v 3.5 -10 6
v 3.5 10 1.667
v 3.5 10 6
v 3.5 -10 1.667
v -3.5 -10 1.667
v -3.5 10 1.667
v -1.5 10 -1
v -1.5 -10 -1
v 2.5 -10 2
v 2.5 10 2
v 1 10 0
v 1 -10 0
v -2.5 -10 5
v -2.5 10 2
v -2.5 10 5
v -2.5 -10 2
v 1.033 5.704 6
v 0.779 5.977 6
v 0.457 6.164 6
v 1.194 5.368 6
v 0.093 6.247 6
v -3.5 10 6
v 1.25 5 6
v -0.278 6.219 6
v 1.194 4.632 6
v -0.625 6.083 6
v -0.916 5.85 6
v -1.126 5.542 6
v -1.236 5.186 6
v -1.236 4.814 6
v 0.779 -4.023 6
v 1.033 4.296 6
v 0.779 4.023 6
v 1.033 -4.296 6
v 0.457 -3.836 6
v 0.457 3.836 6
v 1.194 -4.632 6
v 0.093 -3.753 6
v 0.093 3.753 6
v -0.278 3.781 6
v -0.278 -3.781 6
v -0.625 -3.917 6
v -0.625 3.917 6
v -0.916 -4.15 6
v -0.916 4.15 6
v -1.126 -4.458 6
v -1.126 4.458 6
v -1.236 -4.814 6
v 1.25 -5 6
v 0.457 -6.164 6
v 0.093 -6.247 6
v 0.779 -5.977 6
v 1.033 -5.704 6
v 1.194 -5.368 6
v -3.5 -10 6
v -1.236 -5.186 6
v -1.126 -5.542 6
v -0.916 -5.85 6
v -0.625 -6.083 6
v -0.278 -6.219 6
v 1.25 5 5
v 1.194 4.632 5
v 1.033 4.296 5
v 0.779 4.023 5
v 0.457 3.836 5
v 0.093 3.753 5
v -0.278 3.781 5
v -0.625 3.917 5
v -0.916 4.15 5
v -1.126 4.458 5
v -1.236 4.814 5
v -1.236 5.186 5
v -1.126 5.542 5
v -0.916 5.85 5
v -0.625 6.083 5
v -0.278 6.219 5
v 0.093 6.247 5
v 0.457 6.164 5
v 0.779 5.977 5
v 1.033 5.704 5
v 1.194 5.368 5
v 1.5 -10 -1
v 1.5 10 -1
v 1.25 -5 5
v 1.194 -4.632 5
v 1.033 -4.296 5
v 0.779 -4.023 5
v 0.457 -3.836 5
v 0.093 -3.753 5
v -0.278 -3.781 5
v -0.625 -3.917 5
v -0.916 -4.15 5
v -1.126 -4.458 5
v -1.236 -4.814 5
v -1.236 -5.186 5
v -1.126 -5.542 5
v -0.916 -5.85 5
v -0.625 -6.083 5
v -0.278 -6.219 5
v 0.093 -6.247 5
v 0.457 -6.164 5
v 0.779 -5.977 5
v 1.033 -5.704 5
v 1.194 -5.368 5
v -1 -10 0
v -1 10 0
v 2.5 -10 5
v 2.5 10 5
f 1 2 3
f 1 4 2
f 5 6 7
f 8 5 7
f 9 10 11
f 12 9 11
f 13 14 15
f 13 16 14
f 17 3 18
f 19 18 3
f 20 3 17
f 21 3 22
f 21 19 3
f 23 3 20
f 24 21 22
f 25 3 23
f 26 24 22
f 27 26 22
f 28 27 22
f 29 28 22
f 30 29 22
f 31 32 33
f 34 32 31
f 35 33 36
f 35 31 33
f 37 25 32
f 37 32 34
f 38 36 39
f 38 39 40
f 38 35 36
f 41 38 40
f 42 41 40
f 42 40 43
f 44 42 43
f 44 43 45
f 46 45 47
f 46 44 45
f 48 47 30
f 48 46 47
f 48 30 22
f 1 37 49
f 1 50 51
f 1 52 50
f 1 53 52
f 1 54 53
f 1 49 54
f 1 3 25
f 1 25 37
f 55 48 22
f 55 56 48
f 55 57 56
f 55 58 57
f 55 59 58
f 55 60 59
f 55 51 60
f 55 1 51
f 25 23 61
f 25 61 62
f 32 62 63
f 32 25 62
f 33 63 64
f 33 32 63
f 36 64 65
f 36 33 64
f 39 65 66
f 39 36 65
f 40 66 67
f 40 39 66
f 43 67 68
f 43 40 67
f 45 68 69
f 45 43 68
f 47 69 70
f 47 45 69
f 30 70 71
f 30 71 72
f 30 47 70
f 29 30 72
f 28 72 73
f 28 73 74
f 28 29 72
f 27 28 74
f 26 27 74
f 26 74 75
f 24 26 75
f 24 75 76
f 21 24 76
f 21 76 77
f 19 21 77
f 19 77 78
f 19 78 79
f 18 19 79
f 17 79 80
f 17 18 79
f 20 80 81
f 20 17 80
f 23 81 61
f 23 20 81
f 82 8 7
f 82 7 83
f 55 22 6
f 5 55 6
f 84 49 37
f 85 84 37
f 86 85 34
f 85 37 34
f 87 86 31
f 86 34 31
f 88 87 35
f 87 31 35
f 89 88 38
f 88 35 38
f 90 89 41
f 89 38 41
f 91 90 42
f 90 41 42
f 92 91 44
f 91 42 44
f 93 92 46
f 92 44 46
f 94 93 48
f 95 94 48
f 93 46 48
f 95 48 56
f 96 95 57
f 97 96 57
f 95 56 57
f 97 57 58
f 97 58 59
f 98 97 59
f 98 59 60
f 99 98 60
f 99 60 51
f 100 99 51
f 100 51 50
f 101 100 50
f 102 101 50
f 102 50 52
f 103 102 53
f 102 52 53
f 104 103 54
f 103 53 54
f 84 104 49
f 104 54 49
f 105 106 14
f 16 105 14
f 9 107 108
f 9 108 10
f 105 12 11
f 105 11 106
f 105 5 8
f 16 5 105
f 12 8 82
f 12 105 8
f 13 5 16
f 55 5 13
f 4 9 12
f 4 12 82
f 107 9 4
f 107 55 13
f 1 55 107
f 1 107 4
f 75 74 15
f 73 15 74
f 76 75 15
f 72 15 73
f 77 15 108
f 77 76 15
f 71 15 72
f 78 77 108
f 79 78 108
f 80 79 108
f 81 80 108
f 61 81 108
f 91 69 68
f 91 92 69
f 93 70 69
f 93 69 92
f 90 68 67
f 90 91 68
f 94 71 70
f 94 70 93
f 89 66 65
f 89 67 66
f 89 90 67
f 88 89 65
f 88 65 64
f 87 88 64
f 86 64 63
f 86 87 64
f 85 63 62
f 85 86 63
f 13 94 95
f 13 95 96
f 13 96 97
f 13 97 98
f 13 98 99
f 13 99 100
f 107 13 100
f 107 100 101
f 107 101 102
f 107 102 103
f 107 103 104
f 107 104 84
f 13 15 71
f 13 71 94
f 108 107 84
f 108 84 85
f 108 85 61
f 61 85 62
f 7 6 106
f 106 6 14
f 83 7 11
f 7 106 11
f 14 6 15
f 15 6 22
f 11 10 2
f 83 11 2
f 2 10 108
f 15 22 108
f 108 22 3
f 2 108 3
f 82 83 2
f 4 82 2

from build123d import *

# Parameters (mm, degrees)
F1_DEPTH = 10
F2_R     = 1.25
F3_DEPTH = 1


# Not quite as in the source:
# - ends of sketch curves that miss each other by under 0.0002 mm in the source are joined


with BuildPart() as f1:
    # F0 (on Front) → F1 (new body)
    with BuildSketch(Plane.XZ):
        Polygon((3.5, 6), (-3.4999988526, 6), (-3.5, 1.6666666667), (-1.5, -1), (0, -1), (1.5, -1), (3.5, 1.6666666667), align=None)
        Polygon((-2.5, 5), (0, 5), (2.5, 5), (2.5, 2), (1, 0), (0, 0), (-1, 0), (-2.5, 2), align=None, mode=Mode.SUBTRACT)
    extrude(amount=F1_DEPTH)

    # F2 (on face) → F3 (cut, through all)
    with BuildSketch(Plane.XY.offset(6)):
        with Locations((5.737e-07, -5)):
            Circle(F2_R)
    extrude(amount=-F3_DEPTH, mode=Mode.SUBTRACT)

    # F4: F1 across face


with BuildPart() as f1_1:
    add(f1.part)
    add(f1.part.mirror(Plane(origin=(4.016e-07, 0, 2.8888886977), x_dir=(1, 0, 0), z_dir=(0, 1, 0))))


solid = f1_1.part
